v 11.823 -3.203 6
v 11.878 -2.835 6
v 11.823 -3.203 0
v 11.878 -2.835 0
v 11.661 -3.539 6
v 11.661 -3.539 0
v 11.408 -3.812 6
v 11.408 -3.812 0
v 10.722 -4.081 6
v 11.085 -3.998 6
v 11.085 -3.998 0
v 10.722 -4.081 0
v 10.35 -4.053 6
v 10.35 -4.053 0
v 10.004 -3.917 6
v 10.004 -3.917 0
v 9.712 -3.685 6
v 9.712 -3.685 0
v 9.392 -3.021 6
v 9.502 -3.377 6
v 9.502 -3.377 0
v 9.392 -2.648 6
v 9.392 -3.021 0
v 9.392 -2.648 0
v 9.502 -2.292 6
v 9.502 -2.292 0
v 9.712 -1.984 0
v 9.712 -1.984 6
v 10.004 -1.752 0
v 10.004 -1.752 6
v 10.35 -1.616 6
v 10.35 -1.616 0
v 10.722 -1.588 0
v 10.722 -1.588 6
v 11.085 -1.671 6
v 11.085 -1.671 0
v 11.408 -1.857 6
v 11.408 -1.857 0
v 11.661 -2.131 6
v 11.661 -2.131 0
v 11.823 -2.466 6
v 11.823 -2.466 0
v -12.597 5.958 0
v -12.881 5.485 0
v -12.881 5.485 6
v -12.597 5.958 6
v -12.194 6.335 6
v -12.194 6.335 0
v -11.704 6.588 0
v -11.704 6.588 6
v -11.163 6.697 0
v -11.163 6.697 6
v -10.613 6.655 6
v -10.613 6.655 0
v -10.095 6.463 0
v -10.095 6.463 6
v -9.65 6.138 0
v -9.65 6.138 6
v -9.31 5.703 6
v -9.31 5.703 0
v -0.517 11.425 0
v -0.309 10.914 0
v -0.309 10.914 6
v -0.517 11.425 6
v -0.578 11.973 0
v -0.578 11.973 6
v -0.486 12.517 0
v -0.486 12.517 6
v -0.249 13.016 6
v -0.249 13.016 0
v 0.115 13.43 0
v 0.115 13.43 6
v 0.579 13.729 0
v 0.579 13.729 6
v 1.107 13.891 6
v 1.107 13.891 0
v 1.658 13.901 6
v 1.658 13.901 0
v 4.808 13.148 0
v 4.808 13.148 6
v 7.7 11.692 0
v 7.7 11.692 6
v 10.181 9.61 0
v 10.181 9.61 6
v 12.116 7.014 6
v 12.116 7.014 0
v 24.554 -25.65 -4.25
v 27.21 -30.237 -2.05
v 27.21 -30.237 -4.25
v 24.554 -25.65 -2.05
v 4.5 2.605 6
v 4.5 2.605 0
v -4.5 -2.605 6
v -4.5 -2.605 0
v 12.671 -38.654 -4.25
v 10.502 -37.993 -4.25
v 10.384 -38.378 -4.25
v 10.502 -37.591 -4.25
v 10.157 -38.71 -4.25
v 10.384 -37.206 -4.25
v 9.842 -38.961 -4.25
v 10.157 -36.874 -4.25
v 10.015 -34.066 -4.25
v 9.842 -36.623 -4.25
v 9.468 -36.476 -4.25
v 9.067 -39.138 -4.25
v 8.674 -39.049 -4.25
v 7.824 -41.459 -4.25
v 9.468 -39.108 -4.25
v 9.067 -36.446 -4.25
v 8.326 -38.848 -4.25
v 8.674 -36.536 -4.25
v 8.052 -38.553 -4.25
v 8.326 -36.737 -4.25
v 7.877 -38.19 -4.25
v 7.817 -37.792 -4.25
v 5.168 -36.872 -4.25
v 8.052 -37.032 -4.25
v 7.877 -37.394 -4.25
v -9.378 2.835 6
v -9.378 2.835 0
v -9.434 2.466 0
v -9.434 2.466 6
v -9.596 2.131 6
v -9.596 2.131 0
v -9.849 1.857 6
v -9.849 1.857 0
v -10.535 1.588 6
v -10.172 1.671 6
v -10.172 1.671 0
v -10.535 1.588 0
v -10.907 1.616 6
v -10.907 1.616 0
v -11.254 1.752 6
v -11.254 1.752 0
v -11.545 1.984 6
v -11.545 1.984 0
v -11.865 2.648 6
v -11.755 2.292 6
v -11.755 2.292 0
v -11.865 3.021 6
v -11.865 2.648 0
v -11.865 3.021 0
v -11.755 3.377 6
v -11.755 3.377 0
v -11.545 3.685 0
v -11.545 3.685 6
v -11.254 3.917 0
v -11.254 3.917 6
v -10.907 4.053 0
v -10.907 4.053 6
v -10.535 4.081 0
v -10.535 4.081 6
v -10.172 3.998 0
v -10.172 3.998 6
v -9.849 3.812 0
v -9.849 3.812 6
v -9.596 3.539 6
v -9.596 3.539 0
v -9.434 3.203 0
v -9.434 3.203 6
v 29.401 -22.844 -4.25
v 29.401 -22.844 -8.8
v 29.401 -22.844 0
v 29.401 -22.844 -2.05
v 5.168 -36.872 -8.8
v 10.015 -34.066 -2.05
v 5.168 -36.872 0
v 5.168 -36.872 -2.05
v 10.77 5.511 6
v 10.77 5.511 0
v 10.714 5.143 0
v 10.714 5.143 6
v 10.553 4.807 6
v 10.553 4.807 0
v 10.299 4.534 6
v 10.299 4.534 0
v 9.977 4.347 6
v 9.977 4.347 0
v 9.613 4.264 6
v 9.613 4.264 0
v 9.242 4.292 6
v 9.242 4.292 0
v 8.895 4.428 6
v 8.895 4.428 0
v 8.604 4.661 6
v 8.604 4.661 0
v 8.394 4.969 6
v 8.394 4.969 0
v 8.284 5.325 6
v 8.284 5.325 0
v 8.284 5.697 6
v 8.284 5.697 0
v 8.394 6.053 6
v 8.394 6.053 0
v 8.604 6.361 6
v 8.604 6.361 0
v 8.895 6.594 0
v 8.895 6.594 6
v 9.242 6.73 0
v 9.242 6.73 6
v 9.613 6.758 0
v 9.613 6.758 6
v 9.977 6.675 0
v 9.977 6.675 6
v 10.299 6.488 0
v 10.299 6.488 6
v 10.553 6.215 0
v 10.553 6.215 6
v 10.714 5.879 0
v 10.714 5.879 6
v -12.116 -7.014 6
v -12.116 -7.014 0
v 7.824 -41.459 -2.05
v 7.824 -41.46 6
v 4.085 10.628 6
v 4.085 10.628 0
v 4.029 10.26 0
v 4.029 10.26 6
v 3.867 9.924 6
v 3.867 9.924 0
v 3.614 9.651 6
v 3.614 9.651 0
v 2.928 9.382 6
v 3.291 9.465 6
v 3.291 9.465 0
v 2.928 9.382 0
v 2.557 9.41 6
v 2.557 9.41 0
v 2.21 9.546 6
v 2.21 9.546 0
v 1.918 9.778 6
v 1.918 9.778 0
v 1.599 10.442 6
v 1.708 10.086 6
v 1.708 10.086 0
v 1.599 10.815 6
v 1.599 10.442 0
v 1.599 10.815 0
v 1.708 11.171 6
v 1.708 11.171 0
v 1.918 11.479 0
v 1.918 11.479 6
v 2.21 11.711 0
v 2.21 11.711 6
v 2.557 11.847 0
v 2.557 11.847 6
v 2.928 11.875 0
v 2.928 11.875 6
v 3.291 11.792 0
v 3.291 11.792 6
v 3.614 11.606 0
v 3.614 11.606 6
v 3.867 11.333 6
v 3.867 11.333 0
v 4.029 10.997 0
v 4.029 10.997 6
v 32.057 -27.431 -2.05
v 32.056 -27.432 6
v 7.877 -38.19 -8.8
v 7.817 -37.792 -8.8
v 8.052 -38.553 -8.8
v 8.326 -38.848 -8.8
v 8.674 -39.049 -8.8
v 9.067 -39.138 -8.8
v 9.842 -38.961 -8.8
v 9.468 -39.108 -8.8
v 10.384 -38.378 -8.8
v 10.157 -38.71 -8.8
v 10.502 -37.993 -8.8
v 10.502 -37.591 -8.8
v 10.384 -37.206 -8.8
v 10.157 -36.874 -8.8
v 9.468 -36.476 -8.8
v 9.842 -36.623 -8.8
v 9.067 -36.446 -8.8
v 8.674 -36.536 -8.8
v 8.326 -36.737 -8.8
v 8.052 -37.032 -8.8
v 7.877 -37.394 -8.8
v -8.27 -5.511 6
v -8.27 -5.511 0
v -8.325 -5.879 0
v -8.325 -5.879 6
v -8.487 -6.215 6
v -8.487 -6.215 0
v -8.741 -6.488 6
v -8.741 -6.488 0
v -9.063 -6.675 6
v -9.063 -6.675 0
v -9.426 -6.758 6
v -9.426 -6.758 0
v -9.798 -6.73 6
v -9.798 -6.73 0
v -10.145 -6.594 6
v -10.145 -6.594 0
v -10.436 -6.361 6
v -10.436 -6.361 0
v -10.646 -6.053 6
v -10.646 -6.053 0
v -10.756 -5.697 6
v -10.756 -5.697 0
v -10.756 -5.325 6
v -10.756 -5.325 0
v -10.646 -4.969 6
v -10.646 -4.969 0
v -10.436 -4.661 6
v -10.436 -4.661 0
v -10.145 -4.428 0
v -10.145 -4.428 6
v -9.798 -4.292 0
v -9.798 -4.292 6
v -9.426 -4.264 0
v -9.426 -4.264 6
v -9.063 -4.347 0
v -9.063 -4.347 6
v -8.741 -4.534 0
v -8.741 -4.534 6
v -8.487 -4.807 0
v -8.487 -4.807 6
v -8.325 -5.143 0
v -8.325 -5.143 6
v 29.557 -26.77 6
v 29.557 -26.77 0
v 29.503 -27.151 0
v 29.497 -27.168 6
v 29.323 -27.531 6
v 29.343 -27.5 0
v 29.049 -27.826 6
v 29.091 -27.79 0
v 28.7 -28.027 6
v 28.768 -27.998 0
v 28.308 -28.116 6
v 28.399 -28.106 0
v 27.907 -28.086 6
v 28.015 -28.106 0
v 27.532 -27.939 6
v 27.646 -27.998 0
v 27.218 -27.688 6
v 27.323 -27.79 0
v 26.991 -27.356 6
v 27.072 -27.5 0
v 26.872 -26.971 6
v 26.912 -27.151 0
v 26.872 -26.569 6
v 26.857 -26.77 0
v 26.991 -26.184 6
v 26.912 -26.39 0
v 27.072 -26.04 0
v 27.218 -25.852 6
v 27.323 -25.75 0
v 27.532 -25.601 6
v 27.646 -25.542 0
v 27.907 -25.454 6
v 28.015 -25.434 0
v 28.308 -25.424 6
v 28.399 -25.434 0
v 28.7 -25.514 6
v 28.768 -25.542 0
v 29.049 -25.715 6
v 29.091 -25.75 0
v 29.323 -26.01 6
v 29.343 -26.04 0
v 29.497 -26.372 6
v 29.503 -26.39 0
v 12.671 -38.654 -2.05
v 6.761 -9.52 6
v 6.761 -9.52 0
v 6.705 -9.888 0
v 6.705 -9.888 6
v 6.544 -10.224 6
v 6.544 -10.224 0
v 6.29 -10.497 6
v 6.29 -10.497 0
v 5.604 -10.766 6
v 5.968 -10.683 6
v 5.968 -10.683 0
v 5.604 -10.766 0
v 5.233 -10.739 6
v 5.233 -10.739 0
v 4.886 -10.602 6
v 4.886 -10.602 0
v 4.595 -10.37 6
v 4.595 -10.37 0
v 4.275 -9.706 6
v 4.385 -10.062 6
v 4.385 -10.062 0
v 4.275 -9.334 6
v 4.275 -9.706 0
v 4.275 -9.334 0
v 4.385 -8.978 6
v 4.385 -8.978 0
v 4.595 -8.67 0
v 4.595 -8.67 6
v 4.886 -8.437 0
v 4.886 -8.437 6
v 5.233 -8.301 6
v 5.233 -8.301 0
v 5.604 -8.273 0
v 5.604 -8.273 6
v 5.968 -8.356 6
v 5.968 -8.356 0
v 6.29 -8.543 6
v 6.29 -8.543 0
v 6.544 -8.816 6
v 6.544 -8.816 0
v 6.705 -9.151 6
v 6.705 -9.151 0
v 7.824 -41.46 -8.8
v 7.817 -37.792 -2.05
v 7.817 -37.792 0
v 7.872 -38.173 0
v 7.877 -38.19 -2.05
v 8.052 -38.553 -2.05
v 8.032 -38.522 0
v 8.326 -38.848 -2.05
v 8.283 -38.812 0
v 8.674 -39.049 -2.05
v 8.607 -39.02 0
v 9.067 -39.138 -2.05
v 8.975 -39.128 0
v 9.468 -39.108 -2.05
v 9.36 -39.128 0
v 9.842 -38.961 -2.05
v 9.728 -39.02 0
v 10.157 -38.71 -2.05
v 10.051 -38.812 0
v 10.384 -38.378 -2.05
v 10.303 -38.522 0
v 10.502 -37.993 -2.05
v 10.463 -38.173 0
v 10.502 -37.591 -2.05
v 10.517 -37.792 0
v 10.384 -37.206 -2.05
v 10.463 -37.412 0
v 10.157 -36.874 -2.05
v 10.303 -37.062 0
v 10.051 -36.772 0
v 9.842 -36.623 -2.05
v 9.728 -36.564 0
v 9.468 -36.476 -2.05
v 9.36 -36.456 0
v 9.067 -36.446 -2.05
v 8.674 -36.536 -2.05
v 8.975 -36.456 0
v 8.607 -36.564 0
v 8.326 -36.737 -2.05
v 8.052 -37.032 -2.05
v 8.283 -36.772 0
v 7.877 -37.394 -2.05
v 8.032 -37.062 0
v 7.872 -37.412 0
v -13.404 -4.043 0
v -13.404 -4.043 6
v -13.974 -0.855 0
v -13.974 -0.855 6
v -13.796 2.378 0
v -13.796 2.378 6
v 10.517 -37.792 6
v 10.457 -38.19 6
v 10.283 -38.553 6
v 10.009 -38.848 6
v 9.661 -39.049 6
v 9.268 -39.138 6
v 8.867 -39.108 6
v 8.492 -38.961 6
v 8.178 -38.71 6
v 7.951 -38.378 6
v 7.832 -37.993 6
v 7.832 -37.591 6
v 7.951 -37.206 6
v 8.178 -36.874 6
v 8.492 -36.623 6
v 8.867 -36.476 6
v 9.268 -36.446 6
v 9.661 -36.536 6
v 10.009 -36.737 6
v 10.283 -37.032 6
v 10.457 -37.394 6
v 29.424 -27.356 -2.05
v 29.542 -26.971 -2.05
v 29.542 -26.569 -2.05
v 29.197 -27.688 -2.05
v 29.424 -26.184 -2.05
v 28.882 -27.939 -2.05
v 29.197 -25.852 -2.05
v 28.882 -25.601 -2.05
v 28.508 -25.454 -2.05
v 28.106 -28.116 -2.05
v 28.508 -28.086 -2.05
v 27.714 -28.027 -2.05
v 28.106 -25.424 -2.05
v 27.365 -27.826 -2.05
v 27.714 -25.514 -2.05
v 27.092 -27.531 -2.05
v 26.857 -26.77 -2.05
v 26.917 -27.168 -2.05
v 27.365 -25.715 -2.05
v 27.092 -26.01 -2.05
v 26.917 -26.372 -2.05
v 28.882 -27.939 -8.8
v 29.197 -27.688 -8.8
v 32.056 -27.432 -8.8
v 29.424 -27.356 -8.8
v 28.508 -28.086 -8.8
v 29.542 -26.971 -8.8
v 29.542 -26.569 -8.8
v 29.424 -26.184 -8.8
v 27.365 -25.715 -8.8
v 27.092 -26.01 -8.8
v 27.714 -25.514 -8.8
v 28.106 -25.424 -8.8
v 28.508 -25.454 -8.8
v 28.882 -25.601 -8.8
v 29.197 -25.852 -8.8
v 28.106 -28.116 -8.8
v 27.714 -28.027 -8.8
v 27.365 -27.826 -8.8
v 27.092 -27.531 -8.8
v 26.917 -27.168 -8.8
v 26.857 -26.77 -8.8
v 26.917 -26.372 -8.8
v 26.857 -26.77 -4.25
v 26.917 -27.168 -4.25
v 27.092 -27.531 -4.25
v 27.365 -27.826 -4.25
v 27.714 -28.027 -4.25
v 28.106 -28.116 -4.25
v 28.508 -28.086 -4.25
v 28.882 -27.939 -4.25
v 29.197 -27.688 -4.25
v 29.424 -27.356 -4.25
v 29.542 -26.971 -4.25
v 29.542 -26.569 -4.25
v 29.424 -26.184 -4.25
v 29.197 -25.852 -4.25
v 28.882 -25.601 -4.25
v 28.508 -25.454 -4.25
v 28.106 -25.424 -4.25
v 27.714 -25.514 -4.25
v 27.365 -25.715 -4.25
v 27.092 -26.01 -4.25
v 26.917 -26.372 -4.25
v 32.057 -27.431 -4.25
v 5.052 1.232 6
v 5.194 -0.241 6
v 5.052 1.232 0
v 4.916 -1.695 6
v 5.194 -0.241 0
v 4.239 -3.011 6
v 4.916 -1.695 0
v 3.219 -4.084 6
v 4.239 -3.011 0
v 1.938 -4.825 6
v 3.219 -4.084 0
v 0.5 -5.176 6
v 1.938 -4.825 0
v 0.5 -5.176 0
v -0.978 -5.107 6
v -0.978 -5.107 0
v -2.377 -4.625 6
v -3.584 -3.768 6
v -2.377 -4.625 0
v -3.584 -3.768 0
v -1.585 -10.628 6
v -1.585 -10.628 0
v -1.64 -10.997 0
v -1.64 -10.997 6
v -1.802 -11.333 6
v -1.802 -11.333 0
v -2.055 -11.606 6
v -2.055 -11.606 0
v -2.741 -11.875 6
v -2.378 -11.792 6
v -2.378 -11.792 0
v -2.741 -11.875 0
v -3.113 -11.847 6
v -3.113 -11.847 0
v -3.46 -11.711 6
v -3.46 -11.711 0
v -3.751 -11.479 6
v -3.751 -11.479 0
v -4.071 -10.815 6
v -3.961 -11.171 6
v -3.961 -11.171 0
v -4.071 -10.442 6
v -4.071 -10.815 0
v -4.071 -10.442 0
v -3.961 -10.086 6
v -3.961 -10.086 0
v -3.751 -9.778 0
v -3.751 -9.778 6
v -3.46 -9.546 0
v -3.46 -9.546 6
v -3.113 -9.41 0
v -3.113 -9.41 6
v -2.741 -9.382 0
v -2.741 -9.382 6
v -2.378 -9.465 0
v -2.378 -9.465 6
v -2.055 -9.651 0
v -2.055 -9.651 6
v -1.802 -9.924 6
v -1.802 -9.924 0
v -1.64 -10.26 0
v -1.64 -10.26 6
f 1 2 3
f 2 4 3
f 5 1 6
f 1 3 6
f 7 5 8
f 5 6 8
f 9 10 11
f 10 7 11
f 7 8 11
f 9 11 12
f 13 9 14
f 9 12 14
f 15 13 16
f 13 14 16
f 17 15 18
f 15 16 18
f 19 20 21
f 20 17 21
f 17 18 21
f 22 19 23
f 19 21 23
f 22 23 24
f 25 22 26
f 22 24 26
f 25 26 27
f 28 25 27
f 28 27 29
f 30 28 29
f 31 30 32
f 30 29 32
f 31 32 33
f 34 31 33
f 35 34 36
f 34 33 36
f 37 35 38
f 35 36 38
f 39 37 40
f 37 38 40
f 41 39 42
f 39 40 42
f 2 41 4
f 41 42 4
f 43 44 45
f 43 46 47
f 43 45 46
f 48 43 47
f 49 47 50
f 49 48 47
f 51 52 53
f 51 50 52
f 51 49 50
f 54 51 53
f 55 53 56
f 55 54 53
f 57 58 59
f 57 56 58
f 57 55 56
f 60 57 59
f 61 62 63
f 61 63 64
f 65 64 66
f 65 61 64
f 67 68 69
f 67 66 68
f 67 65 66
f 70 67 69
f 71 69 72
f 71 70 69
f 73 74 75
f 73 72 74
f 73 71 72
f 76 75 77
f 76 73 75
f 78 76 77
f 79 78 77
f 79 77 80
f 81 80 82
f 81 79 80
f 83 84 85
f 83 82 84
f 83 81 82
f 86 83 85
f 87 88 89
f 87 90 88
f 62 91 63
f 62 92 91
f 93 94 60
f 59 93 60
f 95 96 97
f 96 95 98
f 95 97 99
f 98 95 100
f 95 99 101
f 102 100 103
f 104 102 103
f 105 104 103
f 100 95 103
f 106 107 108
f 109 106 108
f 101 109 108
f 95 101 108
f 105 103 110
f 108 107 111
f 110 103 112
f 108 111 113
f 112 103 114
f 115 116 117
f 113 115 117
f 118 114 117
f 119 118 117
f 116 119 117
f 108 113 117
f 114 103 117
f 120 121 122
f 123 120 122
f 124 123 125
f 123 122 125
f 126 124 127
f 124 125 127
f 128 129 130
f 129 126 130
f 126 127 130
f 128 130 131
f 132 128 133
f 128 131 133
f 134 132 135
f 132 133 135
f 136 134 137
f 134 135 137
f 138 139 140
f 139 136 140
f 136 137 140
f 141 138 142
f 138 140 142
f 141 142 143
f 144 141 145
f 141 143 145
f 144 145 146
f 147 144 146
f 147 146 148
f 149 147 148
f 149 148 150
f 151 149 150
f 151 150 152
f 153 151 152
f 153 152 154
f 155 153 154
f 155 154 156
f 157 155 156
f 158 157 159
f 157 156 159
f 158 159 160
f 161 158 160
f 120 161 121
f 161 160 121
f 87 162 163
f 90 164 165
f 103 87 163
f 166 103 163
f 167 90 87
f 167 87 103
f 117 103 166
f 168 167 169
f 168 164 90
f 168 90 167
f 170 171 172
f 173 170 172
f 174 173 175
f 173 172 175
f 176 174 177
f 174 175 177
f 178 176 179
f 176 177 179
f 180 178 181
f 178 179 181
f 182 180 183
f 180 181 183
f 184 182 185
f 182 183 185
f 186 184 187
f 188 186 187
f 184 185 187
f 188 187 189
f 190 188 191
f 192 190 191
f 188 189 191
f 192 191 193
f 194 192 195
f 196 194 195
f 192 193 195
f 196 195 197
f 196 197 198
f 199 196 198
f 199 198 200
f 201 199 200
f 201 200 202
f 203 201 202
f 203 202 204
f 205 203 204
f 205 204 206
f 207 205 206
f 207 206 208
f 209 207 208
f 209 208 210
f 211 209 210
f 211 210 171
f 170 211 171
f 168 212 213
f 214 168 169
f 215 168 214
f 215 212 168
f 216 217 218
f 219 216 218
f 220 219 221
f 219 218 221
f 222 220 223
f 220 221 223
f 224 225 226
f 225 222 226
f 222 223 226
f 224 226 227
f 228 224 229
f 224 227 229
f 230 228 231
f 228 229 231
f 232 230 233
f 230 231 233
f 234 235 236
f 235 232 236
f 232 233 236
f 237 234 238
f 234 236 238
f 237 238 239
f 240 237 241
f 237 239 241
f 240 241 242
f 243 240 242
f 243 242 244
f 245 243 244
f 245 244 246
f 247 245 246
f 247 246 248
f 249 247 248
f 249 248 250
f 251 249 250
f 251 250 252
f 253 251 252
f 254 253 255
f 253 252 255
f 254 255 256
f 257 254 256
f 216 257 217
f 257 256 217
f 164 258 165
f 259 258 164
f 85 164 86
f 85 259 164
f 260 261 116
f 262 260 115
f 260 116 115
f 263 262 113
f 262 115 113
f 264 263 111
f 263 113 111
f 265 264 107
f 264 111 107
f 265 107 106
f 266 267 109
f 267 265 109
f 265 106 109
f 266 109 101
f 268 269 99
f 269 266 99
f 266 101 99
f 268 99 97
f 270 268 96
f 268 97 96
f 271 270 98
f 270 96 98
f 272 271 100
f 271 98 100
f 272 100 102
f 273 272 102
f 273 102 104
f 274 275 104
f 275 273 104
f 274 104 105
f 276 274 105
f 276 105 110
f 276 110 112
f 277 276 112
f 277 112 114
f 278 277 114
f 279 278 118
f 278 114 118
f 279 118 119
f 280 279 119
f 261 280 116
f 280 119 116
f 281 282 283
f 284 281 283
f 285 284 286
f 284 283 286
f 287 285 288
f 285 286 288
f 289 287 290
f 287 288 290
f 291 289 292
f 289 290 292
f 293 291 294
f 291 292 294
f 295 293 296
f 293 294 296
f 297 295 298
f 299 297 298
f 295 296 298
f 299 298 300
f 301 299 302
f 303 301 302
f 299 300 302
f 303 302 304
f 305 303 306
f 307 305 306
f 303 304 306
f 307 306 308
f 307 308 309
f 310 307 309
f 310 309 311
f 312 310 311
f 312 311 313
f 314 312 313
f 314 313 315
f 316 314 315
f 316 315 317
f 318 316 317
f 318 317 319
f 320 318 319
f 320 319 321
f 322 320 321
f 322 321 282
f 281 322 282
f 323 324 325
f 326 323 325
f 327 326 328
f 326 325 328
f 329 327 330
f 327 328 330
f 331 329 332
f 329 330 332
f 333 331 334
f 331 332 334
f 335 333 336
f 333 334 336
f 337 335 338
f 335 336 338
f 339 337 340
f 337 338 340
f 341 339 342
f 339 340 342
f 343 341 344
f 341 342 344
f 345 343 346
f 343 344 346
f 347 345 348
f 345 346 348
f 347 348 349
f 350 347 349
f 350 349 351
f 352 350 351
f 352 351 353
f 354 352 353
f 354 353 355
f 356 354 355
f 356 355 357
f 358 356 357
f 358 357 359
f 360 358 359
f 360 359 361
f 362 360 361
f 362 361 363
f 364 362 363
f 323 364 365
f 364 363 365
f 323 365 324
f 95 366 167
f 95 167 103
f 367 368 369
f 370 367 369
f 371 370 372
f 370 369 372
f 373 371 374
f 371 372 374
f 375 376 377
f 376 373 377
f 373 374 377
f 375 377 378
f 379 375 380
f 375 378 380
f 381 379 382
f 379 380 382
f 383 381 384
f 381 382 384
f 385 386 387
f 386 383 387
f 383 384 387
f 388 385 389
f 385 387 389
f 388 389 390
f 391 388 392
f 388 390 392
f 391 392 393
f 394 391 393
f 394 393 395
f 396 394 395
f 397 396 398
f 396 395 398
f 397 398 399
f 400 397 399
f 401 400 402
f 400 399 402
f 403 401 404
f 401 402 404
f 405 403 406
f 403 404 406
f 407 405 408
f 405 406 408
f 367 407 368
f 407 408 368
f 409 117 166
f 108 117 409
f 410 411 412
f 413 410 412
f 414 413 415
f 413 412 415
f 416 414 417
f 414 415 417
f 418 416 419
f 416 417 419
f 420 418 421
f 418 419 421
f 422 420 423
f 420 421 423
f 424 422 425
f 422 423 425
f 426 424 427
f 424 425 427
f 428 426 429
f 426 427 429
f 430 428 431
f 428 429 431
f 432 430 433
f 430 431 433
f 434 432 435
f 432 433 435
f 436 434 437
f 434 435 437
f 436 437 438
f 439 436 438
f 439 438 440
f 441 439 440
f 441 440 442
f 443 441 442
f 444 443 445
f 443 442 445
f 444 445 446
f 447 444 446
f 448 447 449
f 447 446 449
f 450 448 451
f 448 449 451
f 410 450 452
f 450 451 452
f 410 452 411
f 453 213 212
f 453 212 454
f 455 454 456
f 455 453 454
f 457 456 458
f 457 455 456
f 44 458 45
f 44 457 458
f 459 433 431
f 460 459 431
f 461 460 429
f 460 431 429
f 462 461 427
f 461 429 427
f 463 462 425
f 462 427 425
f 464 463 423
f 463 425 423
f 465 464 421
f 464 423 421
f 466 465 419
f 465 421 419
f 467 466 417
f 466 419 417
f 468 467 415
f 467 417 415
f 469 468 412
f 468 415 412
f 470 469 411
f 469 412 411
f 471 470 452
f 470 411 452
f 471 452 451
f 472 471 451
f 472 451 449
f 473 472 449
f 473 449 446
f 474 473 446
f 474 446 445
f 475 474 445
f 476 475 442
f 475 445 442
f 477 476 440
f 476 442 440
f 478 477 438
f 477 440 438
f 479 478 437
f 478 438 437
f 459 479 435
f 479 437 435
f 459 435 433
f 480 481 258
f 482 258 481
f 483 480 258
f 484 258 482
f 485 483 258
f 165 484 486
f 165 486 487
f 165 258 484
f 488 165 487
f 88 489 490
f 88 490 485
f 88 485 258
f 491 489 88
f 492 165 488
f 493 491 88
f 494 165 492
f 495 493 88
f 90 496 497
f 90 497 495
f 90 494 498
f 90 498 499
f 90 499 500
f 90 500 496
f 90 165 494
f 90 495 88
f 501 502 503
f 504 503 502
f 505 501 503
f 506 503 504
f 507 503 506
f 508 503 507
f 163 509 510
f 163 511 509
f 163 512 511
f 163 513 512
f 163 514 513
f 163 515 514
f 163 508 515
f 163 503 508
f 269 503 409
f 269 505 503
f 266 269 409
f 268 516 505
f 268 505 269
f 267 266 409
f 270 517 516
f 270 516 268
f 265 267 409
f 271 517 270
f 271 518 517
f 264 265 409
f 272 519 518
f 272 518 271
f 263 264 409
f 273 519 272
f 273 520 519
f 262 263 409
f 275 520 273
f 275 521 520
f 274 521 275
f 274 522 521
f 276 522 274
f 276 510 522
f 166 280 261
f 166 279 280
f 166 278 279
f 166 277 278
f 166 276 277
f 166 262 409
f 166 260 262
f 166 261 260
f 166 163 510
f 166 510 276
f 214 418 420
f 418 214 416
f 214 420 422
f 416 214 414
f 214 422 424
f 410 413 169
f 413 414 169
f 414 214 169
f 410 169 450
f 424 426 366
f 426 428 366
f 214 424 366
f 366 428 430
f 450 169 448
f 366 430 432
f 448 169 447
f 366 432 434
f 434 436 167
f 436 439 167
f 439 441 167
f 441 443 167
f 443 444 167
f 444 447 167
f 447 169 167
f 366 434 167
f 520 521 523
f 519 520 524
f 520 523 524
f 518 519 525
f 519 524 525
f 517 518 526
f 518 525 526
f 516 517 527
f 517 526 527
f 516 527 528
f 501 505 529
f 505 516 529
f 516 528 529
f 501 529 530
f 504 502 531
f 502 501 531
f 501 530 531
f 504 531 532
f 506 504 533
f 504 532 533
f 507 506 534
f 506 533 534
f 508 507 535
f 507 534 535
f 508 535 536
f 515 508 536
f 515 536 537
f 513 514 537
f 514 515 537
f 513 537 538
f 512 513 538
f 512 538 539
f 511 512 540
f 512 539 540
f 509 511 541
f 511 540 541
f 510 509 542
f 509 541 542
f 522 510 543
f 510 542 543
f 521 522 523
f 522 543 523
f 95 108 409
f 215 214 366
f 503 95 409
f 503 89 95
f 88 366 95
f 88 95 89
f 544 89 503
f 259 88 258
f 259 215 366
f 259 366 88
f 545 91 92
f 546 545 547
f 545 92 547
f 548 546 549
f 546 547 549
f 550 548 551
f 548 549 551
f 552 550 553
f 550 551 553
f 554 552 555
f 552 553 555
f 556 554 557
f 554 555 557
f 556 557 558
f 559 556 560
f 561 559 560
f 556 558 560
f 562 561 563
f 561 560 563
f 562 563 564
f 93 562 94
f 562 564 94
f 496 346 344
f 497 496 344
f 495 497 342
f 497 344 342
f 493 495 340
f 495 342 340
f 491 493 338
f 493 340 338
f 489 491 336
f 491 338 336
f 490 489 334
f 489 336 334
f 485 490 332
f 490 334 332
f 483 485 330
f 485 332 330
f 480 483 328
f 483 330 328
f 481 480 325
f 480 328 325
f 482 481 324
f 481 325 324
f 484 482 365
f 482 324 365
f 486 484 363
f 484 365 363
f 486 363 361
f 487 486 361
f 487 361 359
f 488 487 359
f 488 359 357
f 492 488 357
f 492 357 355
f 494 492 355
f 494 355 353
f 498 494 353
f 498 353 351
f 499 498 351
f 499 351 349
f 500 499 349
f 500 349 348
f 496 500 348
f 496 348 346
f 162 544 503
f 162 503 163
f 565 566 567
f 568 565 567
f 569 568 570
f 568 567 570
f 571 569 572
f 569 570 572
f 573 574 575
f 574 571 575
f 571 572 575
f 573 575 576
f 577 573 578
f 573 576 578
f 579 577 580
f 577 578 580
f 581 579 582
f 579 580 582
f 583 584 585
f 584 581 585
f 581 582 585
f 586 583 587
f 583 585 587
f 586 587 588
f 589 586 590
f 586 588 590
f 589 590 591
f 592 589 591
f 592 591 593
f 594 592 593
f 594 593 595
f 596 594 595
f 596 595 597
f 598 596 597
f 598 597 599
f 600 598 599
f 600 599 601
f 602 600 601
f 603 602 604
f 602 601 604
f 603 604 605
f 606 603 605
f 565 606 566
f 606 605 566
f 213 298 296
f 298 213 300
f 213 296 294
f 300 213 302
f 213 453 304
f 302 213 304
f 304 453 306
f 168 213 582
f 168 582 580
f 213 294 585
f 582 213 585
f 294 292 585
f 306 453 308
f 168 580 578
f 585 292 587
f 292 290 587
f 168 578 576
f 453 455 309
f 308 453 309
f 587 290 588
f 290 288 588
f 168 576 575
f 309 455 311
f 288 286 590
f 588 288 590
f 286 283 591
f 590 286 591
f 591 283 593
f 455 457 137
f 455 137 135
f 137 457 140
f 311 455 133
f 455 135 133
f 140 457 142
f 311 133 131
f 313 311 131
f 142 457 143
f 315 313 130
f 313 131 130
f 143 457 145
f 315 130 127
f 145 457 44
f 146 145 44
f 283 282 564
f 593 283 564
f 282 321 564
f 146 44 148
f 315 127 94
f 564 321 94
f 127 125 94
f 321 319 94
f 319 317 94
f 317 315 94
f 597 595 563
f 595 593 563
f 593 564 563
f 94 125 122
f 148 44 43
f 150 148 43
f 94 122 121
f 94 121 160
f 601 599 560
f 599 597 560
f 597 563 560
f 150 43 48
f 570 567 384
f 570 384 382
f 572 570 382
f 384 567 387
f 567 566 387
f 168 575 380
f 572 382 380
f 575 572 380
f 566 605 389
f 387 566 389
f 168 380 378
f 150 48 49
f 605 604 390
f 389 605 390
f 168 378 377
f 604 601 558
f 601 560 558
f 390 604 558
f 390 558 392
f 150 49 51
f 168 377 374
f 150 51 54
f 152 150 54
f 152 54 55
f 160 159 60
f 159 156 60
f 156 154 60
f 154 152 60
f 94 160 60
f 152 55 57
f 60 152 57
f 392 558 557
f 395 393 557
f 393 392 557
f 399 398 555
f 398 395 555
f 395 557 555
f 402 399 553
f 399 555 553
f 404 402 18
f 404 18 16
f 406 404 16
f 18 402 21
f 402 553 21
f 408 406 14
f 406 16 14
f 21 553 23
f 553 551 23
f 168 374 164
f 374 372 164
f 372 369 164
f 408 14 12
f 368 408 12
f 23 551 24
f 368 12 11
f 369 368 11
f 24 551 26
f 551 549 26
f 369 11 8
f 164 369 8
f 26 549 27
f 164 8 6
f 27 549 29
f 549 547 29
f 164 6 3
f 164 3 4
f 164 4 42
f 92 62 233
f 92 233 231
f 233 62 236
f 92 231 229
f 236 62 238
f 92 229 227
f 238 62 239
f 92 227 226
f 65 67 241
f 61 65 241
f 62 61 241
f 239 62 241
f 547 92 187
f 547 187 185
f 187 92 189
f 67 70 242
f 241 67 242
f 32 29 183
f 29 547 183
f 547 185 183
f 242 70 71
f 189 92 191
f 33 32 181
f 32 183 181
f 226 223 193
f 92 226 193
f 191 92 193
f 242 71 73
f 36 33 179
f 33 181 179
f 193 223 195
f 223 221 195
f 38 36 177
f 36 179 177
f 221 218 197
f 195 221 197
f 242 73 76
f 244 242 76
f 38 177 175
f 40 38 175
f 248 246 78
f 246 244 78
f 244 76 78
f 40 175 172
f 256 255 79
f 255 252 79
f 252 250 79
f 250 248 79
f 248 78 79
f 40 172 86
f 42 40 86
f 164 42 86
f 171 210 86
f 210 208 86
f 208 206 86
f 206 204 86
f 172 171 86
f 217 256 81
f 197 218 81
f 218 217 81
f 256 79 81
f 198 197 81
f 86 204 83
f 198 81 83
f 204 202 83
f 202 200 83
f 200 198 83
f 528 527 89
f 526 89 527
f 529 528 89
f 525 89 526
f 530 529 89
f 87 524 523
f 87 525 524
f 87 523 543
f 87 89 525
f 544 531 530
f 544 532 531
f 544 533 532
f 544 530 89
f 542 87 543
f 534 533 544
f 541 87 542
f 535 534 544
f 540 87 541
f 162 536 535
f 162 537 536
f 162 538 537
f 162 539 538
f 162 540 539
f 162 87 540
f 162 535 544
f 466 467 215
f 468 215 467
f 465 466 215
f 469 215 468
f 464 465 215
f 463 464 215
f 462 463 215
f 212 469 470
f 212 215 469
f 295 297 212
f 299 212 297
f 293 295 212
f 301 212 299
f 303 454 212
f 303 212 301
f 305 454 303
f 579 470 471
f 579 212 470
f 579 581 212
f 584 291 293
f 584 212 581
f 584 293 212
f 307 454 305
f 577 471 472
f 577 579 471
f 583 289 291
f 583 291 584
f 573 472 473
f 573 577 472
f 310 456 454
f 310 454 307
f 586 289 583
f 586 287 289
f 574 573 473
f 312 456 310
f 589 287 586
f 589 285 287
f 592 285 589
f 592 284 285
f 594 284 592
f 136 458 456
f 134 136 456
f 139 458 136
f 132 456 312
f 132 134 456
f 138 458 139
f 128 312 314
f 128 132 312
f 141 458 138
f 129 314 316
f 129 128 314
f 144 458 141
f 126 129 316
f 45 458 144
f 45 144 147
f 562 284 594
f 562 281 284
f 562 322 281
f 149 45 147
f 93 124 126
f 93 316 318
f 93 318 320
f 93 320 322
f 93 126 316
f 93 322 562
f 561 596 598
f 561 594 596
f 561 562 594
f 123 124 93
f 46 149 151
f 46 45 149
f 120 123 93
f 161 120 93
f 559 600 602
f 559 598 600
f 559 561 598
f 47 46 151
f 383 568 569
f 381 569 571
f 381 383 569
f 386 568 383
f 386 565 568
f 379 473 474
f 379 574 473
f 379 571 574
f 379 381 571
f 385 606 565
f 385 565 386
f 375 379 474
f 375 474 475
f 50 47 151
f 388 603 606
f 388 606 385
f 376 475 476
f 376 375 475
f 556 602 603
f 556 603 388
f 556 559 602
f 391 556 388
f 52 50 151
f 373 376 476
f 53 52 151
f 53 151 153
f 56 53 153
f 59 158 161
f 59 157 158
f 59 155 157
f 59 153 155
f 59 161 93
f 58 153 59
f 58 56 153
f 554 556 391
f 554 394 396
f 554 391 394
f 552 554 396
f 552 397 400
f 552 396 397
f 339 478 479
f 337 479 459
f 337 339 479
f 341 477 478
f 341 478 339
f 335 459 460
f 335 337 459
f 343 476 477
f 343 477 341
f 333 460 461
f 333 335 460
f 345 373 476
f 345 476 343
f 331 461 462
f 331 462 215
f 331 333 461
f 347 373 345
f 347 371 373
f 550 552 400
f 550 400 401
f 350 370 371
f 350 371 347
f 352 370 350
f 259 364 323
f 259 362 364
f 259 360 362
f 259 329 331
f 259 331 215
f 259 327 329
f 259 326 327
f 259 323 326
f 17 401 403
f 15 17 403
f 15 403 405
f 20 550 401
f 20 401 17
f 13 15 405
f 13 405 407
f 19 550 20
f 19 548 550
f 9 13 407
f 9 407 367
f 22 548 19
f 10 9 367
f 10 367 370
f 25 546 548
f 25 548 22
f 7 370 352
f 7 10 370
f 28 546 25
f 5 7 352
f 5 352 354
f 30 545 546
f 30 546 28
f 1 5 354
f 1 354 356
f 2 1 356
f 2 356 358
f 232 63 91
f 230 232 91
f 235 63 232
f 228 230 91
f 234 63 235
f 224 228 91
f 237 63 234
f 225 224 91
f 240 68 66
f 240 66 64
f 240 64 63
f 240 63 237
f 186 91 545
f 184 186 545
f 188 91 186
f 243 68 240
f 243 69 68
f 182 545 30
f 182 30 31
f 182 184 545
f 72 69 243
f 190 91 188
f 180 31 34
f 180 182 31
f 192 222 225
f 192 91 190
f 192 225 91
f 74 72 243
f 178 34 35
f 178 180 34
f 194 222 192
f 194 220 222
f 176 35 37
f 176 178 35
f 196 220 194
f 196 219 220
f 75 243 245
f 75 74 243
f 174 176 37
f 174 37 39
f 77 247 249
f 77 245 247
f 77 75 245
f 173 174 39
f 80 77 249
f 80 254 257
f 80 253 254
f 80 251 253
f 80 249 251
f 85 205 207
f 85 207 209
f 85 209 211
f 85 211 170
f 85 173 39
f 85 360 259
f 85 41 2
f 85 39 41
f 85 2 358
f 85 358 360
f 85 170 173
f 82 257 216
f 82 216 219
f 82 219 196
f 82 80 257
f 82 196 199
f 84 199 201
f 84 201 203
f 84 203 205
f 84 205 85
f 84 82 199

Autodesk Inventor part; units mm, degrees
ref_plane "YZ Plane" through (0, 0, 0) normal (1, 0, 0) x (0, 1, 0)
ref_plane "XZ Plane" through (0, 0, 0) normal (0, 1, 0) x (-1, 0, 0)
ref_plane "XY Plane" through (0, 0, 0) normal (0, 0, 1) x (1, 0, 0)
sketch "스케치2" plane through (0, 0, 0) normal (0, 0, 1) x (1, 0, 0)
  circle A0 centre (0, 0) radius 14 projected
  arc A1 (-12.8234, 5.618) -> (-12.1163, -7.014) centre (0, 0) ccw projected
  line L0 (-12.1163, -7.014) -> (7.824, -41.4595) projected
  line L1 (7.824, -41.4595) -> (32.0565, -27.4315) projected
  line L2 (32.0565, -27.4315) -> (12.1163, 7.014) projected
  arc A2 (12.1163, 7.014) -> (1.5142, 13.9179) centre (0, 0) ccw projected
  circle A3 centre (9.5199, 5.511) radius 1.25 projected
  circle A4 centre (-9.5199, -5.511) radius 1.25 projected
  circle A5 centre (-10.6285, 2.8347) radius 1.25 projected
  circle A6 centre (28.2072, -26.7702) radius 1.35 projected
  circle A7 centre (9.1674, -37.7922) radius 1.35 projected
  circle A8 centre (2.8347, 10.6285) radius 1.25 projected
  circle A9 centre (-2.8347, -10.6285) radius 1.25 projected
  circle A10 centre (5.511, -9.5199) radius 1.25 projected
  circle A11 centre (10.6285, -2.8347) radius 1.25 projected
  circle A12 centre (0, 0) radius 7.25
  line L3 (-9.5199, -5.511) -> (9.5199, 5.511)
  line L4 (9.5199, 5.511) -> (-6.2745, -3.6323)
  arc A13 (-11.0126, 8.6443) -> (1.6585, 13.9014) centre (0, 0) ccw
  line L5 (3.9327, -21.2645) -> (16.4817, -14)
  circle A14 centre (9.5199, 5.511) radius 1.25
  circle A15 centre (-9.5199, -5.511) radius 1.25
  circle A16 centre (-10.6285, 2.8347) radius 1.25
  circle A17 centre (-5.511, 9.5199) radius 1.25
  circle A18 centre (2.8347, 10.6285) radius 1.25
  circle A19 centre (0, 0) radius 7.25
  line L6 (-16.4817, 14) -> (-3.9327, 21.2645)
  circle A20 centre (0, 0) radius 5.2
  line L7 (-4.5003, -2.6052) -> (-9.3099, 5.7031)
  line L8 (4.5003, 2.6052) -> (-0.3093, 10.9135)
  arc A21 (13.8078, -2.3119) -> (-2.0119, 13.8547) centre (0, 0) ccw
  arc A22 (-12.881, 5.4846) -> (-4.8714, -13.1251) centre (0, 0) ccw
  arc A23 (-9.3099, 5.7031) -> (-12.881, 5.4846) centre (-11.0408, 4.7011) ccw
  arc A24 (1.6585, 13.9014) -> (-0.3093, 10.9135) centre (1.4216, 11.9155) ccw
  line L9 (17.8441, -36.8125) -> (14.8381, -31.6198) projected
  line L10 (5.3181, -37.1308) -> (14.8381, -31.6198) projected
  line L11 (8.3241, -42.3235) -> (5.3181, -37.1308) projected
  line L12 (17.8441, -36.8125) -> (8.3241, -42.3235) projected
  circle A25 centre (9.1674, -37.7922) radius 1.35 projected
  line L13 (20.0307, -28.6138) -> (23.0367, -33.8065) projected
  line L14 (32.5567, -28.2955) -> (23.0367, -33.8065) projected
  line L15 (29.5507, -23.1028) -> (32.5567, -28.2955) projected
  line L16 (20.0307, -28.6138) -> (29.5507, -23.1028) projected
  circle A26 centre (28.2072, -26.7702) radius 1.35 projected
  line L17 (8.3606, -42.1868) -> (5.4548, -37.1673)
  line L18 (5.4548, -37.1673) -> (14.8016, -31.7564)
  line L19 (14.8016, -31.7564) -> (17.7074, -36.776)
  line L20 (17.7074, -36.776) -> (8.3606, -42.1868)
  line L21 (8.3606, -42.1868) -> (8.274, -42.2369)
  line L22 (8.274, -42.2369) -> (32.5066, -28.2089)
  point P0 (0, 0)
  point P1 (6.2745, 3.6323)
  point P2 (-0.2742, -13.9973)
  point P3 (12.2747, -6.7328)
  point P4 (0, 0)
  point P5 (0, 0)
  point P6 (-12.2747, 6.7328)
  point P7 (0.2742, 13.9973)
  point P8 (-12.881, 5.4846)
  point P9 (1.6585, 13.9014)
  dimension "d16" = 2
  dimension "d17" = 0.1
extrude "돌출1" add sketch "스케치2" along normal blind 6 contours A0 A23 L7 A12 L8 A24 | A0 L2 L16 L13 L1 L9 L10 L0 | L2 L1 L13 L16 | A12 L3 L8 | L10 L9 L1 L19 L18 L17 L0 | A12 L3 A20 | L7 L3 A12 | L1 L17 L18 L19 picked at (1.2989, -11.4658)
sketch "스케치8" plane through (0, 0, 0) normal (0, 0, -1) x (-1, 0, 0)
  circle A0 centre (9.5199, -5.511) radius 1.25 projected
  circle A1 centre (2.8347, -10.6285) radius 1.25 projected
  circle A2 centre (-5.511, -9.5199) radius 1.25 projected
  circle A3 centre (-10.6285, -2.8347) radius 1.25 projected
  circle A4 centre (-9.5199, 5.511) radius 1.25 projected
  circle A5 centre (-28.2072, -26.7702) radius 1.35 projected
  circle A6 centre (-9.1674, -37.7922) radius 1.35 projected
  line L0 (-7.824, -41.4595) -> (-32.0565, -27.4315) projected
  line L1 (12.1163, -7.014) -> (-7.824, -41.4595) projected
  arc A7 (12.1163, -7.014) -> (12.881, 5.4846) centre (0, 0) ccw projected
  arc A8 (12.881, 5.4846) -> (9.3099, 5.7031) centre (11.0408, 4.7011) ccw projected
  line L2 (4.5003, -2.6052) -> (9.3099, 5.7031) projected
  arc A9 (-4.5003, 2.6052) -> (4.5003, -2.6052) centre (0, 0) ccw projected
  line L3 (0.3093, 10.9135) -> (-4.5003, 2.6052) projected
  arc A10 (0.3093, 10.9135) -> (-1.6585, 13.9014) centre (-1.4216, 11.9155) ccw projected
  arc A11 (-1.6585, 13.9014) -> (-12.1163, 7.014) centre (0, 0) ccw projected
  line L4 (-32.0565, -27.4315) -> (-12.1163, 7.014) projected
  line L5 (-32.0565, -27.4315) -> (-7.824, -41.4595)
  line L6 (-34.4039, -32.4845) -> (-32.673, -33.4865) projected
  arc A12 (-32.673, -33.4865) -> (-29.5985, -32.6665) centre (-31.5458, -31.5392) ccw projected
  line L7 (-29.5985, -32.6665) -> (-28.5965, -30.9356) projected
  arc A13 (-27.2301, -30.5712) -> (-28.5965, -30.9356) centre (-27.7311, -31.4366) ccw projected
  line L8 (-27.2301, -30.5712) -> (-12.9502, -38.8377) projected
  arc A14 (-12.5858, -40.2041) -> (-12.9502, -38.8377) centre (-13.4512, -39.7031) ccw projected
  line L9 (-12.5858, -40.2041) -> (-13.5878, -41.935) projected
  arc A15 (-13.5878, -41.935) -> (-12.7678, -45.0095) centre (-11.6405, -43.0623) ccw projected
  line L10 (-12.7678, -45.0095) -> (-11.0369, -46.0115) projected
  arc A16 (-10.6724, -47.378) -> (-11.0369, -46.0115) centre (-11.5379, -46.877) ccw projected
  line L11 (-10.6724, -47.378) -> (-34.2195, -88.054) projected
  arc A17 (-35.5859, -88.4184) -> (-34.2195, -88.054) centre (-35.0849, -87.553) ccw projected
  line L12 (-35.5859, -88.4184) -> (-37.3168, -87.4164) projected
  arc A18 (-37.3168, -87.4164) -> (-40.3913, -88.2364) centre (-38.444, -89.3637) ccw projected
  line L13 (-40.3913, -88.2364) -> (-41.8943, -90.8328) projected
  line L14 (-36.918, -93.7135) -> (-41.8943, -90.8328) projected
  line L15 (-29.4982, -91.0759) -> (-36.918, -93.7135) projected
  line L16 (-2.8951, -45.1207) -> (-29.4982, -91.0759) projected
  line L17 (-4.3028, -37.3729) -> (-2.8951, -45.1207) projected
  line L18 (-30.2662, -22.3429) -> (-4.3028, -37.3729) projected
  line L19 (-37.686, -24.9805) -> (-30.2662, -22.3429) projected
  line L20 (-64.2892, -70.9357) -> (-37.686, -24.9805) projected
  line L21 (-62.8814, -78.6835) -> (-64.2892, -70.9357) projected
  line L22 (-57.9051, -81.5642) -> (-62.8814, -78.6835) projected
  line L23 (-57.9051, -81.5642) -> (-56.4021, -78.9679) projected
  arc A19 (-56.4021, -78.9679) -> (-57.2221, -75.8934) centre (-58.3493, -77.8406) ccw projected
  line L24 (-57.2221, -75.8934) -> (-58.953, -74.8914) projected
  arc A20 (-59.3174, -73.5249) -> (-58.953, -74.8914) centre (-58.452, -74.0259) ccw projected
  line L25 (-59.3174, -73.5249) -> (-35.7704, -32.8489) projected
  arc A21 (-34.4039, -32.4845) -> (-35.7704, -32.8489) centre (-34.9049, -33.3499) ccw projected
  circle A22 centre (-59.6114, -68.444) radius 1.35 projected
  circle A23 centre (-48.5894, -49.4042) radius 1.35 projected
  circle A24 centre (-28.2072, -26.7702) radius 1.35 projected
  circle A25 centre (-29.667, -85.7786) radius 1.35 projected
  circle A26 centre (-18.6449, -66.7388) radius 1.35 projected
  circle A27 centre (-9.1674, -37.7922) radius 1.35 projected
  circle A28 centre (-37.5674, -30.3643) radius 1.35 projected
  circle A29 centre (-7.6229, -47.699) radius 1.35 projected
  point P0 (0, 0)
  point P1 (-29.4008, -22.8439)
  point P2 (-17.2574, -35.9986)
  point P3 (-5.1683, -36.8719)
extrude "돌출4" add sketch "스케치8" along normal blind 8.8 contours L0 L4 L18 L1
sketch "스케치9" plane through (29.4008, -22.8439, 0) normal (-0.5010009, 0.8654468, 0) x (0.8654468, 0.5010009, 0)
  line L0 (-26.35, 8.8) -> (-23.65, 8.8) projected
  line L1 (-23.65, -6) -> (-26.35, -6) projected
  line L2 (-25, 8.8) -> (-25, -6)
  line L3 (-25, -2.5) -> (-25, 8.8)
  line L4 (-25, 8.8) -> (-25, -2.5)
  line L5 (-25, 3.15) -> (-27.6, 3.15)
  line L6 (-25, 3.15) -> (-22.4, 3.15)
  line L7 (-22.4, 3.15) -> (-22.4, 2.05)
  line L8 (-22.4, 3.15) -> (-22.4, 4.25)
  line L9 (-22.4, 4.25) -> (-27.6, 4.25)
  line L10 (-27.6, 4.25) -> (-27.6, 2.05)
  line L11 (-27.6, 2.05) -> (-22.4, 2.05)
  line L12 (-22.4, 2.05) -> (-22.4, 4.25)
  line L13 (-28, 0) -> (-28, 8.8) projected
  line L14 (-27.6, 4.25) -> (-28, 4.25)
  line L15 (-28, 4.25) -> (-28, 2.05)
  line L16 (-28, 2.05) -> (-27.6, 2.05)
  line L17 (-27.6, 2.05) -> (-27.6, 4.25)
  line L18 (0, 0) -> (-28, 0)
  line L19 (-26.35, -6) -> (-26.35, 8.8) projected
  line L20 (-14, 0) -> (-14, 8.8)
  line L21 (-28, 8.8) -> (0, 8.8) projected
  line L22 (-3, 3.15) -> (-0.4, 3.15)
  line L23 (-3, 3.15) -> (-5.6, 3.15)
  line L24 (-5.6, 3.15) -> (-5.6, 2.05)
  line L25 (-5.6, 3.15) -> (-5.6, 4.25)
  line L26 (-5.6, 4.25) -> (-0.4, 4.25)
  line L27 (-0.4, 4.25) -> (-0.4, 2.05)
  line L28 (-0.4, 2.05) -> (-5.6, 2.05)
  line L29 (-5.6, 2.05) -> (-5.6, 4.25)
  line L30 (-0.4, 4.25) -> (0, 4.25)
  line L31 (0, 4.25) -> (0, 2.05)
  line L32 (0, 2.05) -> (-0.4, 2.05)
  line L33 (-0.4, 2.05) -> (-0.4, 4.25)
  point P0 (-5.6, 2.05)
  point P1 (-0.4, 2.05)
  dimension "d20" = 2.6
  dimension "d21" = 2.6
  dimension "d22" = 1.1
  dimension "d23" = 1.1
extrude "돌출5" cut sketch "스케치9" against normal up to next contours L19 L5 L10 L9 | L9 L2 L5 L19 | L9 L8 L6 L2 | L10 L16 L13 L14 | L19 L11 L10 L5 | L5 L2 L11 L19 | L6 L7 L11 L2 | L23 L25 L26 L27 L22 | L22 L27 L28 L24 L23 | L27 L30 L31 L32
properties part number "부품47" material "PMMA 플라스틱"
